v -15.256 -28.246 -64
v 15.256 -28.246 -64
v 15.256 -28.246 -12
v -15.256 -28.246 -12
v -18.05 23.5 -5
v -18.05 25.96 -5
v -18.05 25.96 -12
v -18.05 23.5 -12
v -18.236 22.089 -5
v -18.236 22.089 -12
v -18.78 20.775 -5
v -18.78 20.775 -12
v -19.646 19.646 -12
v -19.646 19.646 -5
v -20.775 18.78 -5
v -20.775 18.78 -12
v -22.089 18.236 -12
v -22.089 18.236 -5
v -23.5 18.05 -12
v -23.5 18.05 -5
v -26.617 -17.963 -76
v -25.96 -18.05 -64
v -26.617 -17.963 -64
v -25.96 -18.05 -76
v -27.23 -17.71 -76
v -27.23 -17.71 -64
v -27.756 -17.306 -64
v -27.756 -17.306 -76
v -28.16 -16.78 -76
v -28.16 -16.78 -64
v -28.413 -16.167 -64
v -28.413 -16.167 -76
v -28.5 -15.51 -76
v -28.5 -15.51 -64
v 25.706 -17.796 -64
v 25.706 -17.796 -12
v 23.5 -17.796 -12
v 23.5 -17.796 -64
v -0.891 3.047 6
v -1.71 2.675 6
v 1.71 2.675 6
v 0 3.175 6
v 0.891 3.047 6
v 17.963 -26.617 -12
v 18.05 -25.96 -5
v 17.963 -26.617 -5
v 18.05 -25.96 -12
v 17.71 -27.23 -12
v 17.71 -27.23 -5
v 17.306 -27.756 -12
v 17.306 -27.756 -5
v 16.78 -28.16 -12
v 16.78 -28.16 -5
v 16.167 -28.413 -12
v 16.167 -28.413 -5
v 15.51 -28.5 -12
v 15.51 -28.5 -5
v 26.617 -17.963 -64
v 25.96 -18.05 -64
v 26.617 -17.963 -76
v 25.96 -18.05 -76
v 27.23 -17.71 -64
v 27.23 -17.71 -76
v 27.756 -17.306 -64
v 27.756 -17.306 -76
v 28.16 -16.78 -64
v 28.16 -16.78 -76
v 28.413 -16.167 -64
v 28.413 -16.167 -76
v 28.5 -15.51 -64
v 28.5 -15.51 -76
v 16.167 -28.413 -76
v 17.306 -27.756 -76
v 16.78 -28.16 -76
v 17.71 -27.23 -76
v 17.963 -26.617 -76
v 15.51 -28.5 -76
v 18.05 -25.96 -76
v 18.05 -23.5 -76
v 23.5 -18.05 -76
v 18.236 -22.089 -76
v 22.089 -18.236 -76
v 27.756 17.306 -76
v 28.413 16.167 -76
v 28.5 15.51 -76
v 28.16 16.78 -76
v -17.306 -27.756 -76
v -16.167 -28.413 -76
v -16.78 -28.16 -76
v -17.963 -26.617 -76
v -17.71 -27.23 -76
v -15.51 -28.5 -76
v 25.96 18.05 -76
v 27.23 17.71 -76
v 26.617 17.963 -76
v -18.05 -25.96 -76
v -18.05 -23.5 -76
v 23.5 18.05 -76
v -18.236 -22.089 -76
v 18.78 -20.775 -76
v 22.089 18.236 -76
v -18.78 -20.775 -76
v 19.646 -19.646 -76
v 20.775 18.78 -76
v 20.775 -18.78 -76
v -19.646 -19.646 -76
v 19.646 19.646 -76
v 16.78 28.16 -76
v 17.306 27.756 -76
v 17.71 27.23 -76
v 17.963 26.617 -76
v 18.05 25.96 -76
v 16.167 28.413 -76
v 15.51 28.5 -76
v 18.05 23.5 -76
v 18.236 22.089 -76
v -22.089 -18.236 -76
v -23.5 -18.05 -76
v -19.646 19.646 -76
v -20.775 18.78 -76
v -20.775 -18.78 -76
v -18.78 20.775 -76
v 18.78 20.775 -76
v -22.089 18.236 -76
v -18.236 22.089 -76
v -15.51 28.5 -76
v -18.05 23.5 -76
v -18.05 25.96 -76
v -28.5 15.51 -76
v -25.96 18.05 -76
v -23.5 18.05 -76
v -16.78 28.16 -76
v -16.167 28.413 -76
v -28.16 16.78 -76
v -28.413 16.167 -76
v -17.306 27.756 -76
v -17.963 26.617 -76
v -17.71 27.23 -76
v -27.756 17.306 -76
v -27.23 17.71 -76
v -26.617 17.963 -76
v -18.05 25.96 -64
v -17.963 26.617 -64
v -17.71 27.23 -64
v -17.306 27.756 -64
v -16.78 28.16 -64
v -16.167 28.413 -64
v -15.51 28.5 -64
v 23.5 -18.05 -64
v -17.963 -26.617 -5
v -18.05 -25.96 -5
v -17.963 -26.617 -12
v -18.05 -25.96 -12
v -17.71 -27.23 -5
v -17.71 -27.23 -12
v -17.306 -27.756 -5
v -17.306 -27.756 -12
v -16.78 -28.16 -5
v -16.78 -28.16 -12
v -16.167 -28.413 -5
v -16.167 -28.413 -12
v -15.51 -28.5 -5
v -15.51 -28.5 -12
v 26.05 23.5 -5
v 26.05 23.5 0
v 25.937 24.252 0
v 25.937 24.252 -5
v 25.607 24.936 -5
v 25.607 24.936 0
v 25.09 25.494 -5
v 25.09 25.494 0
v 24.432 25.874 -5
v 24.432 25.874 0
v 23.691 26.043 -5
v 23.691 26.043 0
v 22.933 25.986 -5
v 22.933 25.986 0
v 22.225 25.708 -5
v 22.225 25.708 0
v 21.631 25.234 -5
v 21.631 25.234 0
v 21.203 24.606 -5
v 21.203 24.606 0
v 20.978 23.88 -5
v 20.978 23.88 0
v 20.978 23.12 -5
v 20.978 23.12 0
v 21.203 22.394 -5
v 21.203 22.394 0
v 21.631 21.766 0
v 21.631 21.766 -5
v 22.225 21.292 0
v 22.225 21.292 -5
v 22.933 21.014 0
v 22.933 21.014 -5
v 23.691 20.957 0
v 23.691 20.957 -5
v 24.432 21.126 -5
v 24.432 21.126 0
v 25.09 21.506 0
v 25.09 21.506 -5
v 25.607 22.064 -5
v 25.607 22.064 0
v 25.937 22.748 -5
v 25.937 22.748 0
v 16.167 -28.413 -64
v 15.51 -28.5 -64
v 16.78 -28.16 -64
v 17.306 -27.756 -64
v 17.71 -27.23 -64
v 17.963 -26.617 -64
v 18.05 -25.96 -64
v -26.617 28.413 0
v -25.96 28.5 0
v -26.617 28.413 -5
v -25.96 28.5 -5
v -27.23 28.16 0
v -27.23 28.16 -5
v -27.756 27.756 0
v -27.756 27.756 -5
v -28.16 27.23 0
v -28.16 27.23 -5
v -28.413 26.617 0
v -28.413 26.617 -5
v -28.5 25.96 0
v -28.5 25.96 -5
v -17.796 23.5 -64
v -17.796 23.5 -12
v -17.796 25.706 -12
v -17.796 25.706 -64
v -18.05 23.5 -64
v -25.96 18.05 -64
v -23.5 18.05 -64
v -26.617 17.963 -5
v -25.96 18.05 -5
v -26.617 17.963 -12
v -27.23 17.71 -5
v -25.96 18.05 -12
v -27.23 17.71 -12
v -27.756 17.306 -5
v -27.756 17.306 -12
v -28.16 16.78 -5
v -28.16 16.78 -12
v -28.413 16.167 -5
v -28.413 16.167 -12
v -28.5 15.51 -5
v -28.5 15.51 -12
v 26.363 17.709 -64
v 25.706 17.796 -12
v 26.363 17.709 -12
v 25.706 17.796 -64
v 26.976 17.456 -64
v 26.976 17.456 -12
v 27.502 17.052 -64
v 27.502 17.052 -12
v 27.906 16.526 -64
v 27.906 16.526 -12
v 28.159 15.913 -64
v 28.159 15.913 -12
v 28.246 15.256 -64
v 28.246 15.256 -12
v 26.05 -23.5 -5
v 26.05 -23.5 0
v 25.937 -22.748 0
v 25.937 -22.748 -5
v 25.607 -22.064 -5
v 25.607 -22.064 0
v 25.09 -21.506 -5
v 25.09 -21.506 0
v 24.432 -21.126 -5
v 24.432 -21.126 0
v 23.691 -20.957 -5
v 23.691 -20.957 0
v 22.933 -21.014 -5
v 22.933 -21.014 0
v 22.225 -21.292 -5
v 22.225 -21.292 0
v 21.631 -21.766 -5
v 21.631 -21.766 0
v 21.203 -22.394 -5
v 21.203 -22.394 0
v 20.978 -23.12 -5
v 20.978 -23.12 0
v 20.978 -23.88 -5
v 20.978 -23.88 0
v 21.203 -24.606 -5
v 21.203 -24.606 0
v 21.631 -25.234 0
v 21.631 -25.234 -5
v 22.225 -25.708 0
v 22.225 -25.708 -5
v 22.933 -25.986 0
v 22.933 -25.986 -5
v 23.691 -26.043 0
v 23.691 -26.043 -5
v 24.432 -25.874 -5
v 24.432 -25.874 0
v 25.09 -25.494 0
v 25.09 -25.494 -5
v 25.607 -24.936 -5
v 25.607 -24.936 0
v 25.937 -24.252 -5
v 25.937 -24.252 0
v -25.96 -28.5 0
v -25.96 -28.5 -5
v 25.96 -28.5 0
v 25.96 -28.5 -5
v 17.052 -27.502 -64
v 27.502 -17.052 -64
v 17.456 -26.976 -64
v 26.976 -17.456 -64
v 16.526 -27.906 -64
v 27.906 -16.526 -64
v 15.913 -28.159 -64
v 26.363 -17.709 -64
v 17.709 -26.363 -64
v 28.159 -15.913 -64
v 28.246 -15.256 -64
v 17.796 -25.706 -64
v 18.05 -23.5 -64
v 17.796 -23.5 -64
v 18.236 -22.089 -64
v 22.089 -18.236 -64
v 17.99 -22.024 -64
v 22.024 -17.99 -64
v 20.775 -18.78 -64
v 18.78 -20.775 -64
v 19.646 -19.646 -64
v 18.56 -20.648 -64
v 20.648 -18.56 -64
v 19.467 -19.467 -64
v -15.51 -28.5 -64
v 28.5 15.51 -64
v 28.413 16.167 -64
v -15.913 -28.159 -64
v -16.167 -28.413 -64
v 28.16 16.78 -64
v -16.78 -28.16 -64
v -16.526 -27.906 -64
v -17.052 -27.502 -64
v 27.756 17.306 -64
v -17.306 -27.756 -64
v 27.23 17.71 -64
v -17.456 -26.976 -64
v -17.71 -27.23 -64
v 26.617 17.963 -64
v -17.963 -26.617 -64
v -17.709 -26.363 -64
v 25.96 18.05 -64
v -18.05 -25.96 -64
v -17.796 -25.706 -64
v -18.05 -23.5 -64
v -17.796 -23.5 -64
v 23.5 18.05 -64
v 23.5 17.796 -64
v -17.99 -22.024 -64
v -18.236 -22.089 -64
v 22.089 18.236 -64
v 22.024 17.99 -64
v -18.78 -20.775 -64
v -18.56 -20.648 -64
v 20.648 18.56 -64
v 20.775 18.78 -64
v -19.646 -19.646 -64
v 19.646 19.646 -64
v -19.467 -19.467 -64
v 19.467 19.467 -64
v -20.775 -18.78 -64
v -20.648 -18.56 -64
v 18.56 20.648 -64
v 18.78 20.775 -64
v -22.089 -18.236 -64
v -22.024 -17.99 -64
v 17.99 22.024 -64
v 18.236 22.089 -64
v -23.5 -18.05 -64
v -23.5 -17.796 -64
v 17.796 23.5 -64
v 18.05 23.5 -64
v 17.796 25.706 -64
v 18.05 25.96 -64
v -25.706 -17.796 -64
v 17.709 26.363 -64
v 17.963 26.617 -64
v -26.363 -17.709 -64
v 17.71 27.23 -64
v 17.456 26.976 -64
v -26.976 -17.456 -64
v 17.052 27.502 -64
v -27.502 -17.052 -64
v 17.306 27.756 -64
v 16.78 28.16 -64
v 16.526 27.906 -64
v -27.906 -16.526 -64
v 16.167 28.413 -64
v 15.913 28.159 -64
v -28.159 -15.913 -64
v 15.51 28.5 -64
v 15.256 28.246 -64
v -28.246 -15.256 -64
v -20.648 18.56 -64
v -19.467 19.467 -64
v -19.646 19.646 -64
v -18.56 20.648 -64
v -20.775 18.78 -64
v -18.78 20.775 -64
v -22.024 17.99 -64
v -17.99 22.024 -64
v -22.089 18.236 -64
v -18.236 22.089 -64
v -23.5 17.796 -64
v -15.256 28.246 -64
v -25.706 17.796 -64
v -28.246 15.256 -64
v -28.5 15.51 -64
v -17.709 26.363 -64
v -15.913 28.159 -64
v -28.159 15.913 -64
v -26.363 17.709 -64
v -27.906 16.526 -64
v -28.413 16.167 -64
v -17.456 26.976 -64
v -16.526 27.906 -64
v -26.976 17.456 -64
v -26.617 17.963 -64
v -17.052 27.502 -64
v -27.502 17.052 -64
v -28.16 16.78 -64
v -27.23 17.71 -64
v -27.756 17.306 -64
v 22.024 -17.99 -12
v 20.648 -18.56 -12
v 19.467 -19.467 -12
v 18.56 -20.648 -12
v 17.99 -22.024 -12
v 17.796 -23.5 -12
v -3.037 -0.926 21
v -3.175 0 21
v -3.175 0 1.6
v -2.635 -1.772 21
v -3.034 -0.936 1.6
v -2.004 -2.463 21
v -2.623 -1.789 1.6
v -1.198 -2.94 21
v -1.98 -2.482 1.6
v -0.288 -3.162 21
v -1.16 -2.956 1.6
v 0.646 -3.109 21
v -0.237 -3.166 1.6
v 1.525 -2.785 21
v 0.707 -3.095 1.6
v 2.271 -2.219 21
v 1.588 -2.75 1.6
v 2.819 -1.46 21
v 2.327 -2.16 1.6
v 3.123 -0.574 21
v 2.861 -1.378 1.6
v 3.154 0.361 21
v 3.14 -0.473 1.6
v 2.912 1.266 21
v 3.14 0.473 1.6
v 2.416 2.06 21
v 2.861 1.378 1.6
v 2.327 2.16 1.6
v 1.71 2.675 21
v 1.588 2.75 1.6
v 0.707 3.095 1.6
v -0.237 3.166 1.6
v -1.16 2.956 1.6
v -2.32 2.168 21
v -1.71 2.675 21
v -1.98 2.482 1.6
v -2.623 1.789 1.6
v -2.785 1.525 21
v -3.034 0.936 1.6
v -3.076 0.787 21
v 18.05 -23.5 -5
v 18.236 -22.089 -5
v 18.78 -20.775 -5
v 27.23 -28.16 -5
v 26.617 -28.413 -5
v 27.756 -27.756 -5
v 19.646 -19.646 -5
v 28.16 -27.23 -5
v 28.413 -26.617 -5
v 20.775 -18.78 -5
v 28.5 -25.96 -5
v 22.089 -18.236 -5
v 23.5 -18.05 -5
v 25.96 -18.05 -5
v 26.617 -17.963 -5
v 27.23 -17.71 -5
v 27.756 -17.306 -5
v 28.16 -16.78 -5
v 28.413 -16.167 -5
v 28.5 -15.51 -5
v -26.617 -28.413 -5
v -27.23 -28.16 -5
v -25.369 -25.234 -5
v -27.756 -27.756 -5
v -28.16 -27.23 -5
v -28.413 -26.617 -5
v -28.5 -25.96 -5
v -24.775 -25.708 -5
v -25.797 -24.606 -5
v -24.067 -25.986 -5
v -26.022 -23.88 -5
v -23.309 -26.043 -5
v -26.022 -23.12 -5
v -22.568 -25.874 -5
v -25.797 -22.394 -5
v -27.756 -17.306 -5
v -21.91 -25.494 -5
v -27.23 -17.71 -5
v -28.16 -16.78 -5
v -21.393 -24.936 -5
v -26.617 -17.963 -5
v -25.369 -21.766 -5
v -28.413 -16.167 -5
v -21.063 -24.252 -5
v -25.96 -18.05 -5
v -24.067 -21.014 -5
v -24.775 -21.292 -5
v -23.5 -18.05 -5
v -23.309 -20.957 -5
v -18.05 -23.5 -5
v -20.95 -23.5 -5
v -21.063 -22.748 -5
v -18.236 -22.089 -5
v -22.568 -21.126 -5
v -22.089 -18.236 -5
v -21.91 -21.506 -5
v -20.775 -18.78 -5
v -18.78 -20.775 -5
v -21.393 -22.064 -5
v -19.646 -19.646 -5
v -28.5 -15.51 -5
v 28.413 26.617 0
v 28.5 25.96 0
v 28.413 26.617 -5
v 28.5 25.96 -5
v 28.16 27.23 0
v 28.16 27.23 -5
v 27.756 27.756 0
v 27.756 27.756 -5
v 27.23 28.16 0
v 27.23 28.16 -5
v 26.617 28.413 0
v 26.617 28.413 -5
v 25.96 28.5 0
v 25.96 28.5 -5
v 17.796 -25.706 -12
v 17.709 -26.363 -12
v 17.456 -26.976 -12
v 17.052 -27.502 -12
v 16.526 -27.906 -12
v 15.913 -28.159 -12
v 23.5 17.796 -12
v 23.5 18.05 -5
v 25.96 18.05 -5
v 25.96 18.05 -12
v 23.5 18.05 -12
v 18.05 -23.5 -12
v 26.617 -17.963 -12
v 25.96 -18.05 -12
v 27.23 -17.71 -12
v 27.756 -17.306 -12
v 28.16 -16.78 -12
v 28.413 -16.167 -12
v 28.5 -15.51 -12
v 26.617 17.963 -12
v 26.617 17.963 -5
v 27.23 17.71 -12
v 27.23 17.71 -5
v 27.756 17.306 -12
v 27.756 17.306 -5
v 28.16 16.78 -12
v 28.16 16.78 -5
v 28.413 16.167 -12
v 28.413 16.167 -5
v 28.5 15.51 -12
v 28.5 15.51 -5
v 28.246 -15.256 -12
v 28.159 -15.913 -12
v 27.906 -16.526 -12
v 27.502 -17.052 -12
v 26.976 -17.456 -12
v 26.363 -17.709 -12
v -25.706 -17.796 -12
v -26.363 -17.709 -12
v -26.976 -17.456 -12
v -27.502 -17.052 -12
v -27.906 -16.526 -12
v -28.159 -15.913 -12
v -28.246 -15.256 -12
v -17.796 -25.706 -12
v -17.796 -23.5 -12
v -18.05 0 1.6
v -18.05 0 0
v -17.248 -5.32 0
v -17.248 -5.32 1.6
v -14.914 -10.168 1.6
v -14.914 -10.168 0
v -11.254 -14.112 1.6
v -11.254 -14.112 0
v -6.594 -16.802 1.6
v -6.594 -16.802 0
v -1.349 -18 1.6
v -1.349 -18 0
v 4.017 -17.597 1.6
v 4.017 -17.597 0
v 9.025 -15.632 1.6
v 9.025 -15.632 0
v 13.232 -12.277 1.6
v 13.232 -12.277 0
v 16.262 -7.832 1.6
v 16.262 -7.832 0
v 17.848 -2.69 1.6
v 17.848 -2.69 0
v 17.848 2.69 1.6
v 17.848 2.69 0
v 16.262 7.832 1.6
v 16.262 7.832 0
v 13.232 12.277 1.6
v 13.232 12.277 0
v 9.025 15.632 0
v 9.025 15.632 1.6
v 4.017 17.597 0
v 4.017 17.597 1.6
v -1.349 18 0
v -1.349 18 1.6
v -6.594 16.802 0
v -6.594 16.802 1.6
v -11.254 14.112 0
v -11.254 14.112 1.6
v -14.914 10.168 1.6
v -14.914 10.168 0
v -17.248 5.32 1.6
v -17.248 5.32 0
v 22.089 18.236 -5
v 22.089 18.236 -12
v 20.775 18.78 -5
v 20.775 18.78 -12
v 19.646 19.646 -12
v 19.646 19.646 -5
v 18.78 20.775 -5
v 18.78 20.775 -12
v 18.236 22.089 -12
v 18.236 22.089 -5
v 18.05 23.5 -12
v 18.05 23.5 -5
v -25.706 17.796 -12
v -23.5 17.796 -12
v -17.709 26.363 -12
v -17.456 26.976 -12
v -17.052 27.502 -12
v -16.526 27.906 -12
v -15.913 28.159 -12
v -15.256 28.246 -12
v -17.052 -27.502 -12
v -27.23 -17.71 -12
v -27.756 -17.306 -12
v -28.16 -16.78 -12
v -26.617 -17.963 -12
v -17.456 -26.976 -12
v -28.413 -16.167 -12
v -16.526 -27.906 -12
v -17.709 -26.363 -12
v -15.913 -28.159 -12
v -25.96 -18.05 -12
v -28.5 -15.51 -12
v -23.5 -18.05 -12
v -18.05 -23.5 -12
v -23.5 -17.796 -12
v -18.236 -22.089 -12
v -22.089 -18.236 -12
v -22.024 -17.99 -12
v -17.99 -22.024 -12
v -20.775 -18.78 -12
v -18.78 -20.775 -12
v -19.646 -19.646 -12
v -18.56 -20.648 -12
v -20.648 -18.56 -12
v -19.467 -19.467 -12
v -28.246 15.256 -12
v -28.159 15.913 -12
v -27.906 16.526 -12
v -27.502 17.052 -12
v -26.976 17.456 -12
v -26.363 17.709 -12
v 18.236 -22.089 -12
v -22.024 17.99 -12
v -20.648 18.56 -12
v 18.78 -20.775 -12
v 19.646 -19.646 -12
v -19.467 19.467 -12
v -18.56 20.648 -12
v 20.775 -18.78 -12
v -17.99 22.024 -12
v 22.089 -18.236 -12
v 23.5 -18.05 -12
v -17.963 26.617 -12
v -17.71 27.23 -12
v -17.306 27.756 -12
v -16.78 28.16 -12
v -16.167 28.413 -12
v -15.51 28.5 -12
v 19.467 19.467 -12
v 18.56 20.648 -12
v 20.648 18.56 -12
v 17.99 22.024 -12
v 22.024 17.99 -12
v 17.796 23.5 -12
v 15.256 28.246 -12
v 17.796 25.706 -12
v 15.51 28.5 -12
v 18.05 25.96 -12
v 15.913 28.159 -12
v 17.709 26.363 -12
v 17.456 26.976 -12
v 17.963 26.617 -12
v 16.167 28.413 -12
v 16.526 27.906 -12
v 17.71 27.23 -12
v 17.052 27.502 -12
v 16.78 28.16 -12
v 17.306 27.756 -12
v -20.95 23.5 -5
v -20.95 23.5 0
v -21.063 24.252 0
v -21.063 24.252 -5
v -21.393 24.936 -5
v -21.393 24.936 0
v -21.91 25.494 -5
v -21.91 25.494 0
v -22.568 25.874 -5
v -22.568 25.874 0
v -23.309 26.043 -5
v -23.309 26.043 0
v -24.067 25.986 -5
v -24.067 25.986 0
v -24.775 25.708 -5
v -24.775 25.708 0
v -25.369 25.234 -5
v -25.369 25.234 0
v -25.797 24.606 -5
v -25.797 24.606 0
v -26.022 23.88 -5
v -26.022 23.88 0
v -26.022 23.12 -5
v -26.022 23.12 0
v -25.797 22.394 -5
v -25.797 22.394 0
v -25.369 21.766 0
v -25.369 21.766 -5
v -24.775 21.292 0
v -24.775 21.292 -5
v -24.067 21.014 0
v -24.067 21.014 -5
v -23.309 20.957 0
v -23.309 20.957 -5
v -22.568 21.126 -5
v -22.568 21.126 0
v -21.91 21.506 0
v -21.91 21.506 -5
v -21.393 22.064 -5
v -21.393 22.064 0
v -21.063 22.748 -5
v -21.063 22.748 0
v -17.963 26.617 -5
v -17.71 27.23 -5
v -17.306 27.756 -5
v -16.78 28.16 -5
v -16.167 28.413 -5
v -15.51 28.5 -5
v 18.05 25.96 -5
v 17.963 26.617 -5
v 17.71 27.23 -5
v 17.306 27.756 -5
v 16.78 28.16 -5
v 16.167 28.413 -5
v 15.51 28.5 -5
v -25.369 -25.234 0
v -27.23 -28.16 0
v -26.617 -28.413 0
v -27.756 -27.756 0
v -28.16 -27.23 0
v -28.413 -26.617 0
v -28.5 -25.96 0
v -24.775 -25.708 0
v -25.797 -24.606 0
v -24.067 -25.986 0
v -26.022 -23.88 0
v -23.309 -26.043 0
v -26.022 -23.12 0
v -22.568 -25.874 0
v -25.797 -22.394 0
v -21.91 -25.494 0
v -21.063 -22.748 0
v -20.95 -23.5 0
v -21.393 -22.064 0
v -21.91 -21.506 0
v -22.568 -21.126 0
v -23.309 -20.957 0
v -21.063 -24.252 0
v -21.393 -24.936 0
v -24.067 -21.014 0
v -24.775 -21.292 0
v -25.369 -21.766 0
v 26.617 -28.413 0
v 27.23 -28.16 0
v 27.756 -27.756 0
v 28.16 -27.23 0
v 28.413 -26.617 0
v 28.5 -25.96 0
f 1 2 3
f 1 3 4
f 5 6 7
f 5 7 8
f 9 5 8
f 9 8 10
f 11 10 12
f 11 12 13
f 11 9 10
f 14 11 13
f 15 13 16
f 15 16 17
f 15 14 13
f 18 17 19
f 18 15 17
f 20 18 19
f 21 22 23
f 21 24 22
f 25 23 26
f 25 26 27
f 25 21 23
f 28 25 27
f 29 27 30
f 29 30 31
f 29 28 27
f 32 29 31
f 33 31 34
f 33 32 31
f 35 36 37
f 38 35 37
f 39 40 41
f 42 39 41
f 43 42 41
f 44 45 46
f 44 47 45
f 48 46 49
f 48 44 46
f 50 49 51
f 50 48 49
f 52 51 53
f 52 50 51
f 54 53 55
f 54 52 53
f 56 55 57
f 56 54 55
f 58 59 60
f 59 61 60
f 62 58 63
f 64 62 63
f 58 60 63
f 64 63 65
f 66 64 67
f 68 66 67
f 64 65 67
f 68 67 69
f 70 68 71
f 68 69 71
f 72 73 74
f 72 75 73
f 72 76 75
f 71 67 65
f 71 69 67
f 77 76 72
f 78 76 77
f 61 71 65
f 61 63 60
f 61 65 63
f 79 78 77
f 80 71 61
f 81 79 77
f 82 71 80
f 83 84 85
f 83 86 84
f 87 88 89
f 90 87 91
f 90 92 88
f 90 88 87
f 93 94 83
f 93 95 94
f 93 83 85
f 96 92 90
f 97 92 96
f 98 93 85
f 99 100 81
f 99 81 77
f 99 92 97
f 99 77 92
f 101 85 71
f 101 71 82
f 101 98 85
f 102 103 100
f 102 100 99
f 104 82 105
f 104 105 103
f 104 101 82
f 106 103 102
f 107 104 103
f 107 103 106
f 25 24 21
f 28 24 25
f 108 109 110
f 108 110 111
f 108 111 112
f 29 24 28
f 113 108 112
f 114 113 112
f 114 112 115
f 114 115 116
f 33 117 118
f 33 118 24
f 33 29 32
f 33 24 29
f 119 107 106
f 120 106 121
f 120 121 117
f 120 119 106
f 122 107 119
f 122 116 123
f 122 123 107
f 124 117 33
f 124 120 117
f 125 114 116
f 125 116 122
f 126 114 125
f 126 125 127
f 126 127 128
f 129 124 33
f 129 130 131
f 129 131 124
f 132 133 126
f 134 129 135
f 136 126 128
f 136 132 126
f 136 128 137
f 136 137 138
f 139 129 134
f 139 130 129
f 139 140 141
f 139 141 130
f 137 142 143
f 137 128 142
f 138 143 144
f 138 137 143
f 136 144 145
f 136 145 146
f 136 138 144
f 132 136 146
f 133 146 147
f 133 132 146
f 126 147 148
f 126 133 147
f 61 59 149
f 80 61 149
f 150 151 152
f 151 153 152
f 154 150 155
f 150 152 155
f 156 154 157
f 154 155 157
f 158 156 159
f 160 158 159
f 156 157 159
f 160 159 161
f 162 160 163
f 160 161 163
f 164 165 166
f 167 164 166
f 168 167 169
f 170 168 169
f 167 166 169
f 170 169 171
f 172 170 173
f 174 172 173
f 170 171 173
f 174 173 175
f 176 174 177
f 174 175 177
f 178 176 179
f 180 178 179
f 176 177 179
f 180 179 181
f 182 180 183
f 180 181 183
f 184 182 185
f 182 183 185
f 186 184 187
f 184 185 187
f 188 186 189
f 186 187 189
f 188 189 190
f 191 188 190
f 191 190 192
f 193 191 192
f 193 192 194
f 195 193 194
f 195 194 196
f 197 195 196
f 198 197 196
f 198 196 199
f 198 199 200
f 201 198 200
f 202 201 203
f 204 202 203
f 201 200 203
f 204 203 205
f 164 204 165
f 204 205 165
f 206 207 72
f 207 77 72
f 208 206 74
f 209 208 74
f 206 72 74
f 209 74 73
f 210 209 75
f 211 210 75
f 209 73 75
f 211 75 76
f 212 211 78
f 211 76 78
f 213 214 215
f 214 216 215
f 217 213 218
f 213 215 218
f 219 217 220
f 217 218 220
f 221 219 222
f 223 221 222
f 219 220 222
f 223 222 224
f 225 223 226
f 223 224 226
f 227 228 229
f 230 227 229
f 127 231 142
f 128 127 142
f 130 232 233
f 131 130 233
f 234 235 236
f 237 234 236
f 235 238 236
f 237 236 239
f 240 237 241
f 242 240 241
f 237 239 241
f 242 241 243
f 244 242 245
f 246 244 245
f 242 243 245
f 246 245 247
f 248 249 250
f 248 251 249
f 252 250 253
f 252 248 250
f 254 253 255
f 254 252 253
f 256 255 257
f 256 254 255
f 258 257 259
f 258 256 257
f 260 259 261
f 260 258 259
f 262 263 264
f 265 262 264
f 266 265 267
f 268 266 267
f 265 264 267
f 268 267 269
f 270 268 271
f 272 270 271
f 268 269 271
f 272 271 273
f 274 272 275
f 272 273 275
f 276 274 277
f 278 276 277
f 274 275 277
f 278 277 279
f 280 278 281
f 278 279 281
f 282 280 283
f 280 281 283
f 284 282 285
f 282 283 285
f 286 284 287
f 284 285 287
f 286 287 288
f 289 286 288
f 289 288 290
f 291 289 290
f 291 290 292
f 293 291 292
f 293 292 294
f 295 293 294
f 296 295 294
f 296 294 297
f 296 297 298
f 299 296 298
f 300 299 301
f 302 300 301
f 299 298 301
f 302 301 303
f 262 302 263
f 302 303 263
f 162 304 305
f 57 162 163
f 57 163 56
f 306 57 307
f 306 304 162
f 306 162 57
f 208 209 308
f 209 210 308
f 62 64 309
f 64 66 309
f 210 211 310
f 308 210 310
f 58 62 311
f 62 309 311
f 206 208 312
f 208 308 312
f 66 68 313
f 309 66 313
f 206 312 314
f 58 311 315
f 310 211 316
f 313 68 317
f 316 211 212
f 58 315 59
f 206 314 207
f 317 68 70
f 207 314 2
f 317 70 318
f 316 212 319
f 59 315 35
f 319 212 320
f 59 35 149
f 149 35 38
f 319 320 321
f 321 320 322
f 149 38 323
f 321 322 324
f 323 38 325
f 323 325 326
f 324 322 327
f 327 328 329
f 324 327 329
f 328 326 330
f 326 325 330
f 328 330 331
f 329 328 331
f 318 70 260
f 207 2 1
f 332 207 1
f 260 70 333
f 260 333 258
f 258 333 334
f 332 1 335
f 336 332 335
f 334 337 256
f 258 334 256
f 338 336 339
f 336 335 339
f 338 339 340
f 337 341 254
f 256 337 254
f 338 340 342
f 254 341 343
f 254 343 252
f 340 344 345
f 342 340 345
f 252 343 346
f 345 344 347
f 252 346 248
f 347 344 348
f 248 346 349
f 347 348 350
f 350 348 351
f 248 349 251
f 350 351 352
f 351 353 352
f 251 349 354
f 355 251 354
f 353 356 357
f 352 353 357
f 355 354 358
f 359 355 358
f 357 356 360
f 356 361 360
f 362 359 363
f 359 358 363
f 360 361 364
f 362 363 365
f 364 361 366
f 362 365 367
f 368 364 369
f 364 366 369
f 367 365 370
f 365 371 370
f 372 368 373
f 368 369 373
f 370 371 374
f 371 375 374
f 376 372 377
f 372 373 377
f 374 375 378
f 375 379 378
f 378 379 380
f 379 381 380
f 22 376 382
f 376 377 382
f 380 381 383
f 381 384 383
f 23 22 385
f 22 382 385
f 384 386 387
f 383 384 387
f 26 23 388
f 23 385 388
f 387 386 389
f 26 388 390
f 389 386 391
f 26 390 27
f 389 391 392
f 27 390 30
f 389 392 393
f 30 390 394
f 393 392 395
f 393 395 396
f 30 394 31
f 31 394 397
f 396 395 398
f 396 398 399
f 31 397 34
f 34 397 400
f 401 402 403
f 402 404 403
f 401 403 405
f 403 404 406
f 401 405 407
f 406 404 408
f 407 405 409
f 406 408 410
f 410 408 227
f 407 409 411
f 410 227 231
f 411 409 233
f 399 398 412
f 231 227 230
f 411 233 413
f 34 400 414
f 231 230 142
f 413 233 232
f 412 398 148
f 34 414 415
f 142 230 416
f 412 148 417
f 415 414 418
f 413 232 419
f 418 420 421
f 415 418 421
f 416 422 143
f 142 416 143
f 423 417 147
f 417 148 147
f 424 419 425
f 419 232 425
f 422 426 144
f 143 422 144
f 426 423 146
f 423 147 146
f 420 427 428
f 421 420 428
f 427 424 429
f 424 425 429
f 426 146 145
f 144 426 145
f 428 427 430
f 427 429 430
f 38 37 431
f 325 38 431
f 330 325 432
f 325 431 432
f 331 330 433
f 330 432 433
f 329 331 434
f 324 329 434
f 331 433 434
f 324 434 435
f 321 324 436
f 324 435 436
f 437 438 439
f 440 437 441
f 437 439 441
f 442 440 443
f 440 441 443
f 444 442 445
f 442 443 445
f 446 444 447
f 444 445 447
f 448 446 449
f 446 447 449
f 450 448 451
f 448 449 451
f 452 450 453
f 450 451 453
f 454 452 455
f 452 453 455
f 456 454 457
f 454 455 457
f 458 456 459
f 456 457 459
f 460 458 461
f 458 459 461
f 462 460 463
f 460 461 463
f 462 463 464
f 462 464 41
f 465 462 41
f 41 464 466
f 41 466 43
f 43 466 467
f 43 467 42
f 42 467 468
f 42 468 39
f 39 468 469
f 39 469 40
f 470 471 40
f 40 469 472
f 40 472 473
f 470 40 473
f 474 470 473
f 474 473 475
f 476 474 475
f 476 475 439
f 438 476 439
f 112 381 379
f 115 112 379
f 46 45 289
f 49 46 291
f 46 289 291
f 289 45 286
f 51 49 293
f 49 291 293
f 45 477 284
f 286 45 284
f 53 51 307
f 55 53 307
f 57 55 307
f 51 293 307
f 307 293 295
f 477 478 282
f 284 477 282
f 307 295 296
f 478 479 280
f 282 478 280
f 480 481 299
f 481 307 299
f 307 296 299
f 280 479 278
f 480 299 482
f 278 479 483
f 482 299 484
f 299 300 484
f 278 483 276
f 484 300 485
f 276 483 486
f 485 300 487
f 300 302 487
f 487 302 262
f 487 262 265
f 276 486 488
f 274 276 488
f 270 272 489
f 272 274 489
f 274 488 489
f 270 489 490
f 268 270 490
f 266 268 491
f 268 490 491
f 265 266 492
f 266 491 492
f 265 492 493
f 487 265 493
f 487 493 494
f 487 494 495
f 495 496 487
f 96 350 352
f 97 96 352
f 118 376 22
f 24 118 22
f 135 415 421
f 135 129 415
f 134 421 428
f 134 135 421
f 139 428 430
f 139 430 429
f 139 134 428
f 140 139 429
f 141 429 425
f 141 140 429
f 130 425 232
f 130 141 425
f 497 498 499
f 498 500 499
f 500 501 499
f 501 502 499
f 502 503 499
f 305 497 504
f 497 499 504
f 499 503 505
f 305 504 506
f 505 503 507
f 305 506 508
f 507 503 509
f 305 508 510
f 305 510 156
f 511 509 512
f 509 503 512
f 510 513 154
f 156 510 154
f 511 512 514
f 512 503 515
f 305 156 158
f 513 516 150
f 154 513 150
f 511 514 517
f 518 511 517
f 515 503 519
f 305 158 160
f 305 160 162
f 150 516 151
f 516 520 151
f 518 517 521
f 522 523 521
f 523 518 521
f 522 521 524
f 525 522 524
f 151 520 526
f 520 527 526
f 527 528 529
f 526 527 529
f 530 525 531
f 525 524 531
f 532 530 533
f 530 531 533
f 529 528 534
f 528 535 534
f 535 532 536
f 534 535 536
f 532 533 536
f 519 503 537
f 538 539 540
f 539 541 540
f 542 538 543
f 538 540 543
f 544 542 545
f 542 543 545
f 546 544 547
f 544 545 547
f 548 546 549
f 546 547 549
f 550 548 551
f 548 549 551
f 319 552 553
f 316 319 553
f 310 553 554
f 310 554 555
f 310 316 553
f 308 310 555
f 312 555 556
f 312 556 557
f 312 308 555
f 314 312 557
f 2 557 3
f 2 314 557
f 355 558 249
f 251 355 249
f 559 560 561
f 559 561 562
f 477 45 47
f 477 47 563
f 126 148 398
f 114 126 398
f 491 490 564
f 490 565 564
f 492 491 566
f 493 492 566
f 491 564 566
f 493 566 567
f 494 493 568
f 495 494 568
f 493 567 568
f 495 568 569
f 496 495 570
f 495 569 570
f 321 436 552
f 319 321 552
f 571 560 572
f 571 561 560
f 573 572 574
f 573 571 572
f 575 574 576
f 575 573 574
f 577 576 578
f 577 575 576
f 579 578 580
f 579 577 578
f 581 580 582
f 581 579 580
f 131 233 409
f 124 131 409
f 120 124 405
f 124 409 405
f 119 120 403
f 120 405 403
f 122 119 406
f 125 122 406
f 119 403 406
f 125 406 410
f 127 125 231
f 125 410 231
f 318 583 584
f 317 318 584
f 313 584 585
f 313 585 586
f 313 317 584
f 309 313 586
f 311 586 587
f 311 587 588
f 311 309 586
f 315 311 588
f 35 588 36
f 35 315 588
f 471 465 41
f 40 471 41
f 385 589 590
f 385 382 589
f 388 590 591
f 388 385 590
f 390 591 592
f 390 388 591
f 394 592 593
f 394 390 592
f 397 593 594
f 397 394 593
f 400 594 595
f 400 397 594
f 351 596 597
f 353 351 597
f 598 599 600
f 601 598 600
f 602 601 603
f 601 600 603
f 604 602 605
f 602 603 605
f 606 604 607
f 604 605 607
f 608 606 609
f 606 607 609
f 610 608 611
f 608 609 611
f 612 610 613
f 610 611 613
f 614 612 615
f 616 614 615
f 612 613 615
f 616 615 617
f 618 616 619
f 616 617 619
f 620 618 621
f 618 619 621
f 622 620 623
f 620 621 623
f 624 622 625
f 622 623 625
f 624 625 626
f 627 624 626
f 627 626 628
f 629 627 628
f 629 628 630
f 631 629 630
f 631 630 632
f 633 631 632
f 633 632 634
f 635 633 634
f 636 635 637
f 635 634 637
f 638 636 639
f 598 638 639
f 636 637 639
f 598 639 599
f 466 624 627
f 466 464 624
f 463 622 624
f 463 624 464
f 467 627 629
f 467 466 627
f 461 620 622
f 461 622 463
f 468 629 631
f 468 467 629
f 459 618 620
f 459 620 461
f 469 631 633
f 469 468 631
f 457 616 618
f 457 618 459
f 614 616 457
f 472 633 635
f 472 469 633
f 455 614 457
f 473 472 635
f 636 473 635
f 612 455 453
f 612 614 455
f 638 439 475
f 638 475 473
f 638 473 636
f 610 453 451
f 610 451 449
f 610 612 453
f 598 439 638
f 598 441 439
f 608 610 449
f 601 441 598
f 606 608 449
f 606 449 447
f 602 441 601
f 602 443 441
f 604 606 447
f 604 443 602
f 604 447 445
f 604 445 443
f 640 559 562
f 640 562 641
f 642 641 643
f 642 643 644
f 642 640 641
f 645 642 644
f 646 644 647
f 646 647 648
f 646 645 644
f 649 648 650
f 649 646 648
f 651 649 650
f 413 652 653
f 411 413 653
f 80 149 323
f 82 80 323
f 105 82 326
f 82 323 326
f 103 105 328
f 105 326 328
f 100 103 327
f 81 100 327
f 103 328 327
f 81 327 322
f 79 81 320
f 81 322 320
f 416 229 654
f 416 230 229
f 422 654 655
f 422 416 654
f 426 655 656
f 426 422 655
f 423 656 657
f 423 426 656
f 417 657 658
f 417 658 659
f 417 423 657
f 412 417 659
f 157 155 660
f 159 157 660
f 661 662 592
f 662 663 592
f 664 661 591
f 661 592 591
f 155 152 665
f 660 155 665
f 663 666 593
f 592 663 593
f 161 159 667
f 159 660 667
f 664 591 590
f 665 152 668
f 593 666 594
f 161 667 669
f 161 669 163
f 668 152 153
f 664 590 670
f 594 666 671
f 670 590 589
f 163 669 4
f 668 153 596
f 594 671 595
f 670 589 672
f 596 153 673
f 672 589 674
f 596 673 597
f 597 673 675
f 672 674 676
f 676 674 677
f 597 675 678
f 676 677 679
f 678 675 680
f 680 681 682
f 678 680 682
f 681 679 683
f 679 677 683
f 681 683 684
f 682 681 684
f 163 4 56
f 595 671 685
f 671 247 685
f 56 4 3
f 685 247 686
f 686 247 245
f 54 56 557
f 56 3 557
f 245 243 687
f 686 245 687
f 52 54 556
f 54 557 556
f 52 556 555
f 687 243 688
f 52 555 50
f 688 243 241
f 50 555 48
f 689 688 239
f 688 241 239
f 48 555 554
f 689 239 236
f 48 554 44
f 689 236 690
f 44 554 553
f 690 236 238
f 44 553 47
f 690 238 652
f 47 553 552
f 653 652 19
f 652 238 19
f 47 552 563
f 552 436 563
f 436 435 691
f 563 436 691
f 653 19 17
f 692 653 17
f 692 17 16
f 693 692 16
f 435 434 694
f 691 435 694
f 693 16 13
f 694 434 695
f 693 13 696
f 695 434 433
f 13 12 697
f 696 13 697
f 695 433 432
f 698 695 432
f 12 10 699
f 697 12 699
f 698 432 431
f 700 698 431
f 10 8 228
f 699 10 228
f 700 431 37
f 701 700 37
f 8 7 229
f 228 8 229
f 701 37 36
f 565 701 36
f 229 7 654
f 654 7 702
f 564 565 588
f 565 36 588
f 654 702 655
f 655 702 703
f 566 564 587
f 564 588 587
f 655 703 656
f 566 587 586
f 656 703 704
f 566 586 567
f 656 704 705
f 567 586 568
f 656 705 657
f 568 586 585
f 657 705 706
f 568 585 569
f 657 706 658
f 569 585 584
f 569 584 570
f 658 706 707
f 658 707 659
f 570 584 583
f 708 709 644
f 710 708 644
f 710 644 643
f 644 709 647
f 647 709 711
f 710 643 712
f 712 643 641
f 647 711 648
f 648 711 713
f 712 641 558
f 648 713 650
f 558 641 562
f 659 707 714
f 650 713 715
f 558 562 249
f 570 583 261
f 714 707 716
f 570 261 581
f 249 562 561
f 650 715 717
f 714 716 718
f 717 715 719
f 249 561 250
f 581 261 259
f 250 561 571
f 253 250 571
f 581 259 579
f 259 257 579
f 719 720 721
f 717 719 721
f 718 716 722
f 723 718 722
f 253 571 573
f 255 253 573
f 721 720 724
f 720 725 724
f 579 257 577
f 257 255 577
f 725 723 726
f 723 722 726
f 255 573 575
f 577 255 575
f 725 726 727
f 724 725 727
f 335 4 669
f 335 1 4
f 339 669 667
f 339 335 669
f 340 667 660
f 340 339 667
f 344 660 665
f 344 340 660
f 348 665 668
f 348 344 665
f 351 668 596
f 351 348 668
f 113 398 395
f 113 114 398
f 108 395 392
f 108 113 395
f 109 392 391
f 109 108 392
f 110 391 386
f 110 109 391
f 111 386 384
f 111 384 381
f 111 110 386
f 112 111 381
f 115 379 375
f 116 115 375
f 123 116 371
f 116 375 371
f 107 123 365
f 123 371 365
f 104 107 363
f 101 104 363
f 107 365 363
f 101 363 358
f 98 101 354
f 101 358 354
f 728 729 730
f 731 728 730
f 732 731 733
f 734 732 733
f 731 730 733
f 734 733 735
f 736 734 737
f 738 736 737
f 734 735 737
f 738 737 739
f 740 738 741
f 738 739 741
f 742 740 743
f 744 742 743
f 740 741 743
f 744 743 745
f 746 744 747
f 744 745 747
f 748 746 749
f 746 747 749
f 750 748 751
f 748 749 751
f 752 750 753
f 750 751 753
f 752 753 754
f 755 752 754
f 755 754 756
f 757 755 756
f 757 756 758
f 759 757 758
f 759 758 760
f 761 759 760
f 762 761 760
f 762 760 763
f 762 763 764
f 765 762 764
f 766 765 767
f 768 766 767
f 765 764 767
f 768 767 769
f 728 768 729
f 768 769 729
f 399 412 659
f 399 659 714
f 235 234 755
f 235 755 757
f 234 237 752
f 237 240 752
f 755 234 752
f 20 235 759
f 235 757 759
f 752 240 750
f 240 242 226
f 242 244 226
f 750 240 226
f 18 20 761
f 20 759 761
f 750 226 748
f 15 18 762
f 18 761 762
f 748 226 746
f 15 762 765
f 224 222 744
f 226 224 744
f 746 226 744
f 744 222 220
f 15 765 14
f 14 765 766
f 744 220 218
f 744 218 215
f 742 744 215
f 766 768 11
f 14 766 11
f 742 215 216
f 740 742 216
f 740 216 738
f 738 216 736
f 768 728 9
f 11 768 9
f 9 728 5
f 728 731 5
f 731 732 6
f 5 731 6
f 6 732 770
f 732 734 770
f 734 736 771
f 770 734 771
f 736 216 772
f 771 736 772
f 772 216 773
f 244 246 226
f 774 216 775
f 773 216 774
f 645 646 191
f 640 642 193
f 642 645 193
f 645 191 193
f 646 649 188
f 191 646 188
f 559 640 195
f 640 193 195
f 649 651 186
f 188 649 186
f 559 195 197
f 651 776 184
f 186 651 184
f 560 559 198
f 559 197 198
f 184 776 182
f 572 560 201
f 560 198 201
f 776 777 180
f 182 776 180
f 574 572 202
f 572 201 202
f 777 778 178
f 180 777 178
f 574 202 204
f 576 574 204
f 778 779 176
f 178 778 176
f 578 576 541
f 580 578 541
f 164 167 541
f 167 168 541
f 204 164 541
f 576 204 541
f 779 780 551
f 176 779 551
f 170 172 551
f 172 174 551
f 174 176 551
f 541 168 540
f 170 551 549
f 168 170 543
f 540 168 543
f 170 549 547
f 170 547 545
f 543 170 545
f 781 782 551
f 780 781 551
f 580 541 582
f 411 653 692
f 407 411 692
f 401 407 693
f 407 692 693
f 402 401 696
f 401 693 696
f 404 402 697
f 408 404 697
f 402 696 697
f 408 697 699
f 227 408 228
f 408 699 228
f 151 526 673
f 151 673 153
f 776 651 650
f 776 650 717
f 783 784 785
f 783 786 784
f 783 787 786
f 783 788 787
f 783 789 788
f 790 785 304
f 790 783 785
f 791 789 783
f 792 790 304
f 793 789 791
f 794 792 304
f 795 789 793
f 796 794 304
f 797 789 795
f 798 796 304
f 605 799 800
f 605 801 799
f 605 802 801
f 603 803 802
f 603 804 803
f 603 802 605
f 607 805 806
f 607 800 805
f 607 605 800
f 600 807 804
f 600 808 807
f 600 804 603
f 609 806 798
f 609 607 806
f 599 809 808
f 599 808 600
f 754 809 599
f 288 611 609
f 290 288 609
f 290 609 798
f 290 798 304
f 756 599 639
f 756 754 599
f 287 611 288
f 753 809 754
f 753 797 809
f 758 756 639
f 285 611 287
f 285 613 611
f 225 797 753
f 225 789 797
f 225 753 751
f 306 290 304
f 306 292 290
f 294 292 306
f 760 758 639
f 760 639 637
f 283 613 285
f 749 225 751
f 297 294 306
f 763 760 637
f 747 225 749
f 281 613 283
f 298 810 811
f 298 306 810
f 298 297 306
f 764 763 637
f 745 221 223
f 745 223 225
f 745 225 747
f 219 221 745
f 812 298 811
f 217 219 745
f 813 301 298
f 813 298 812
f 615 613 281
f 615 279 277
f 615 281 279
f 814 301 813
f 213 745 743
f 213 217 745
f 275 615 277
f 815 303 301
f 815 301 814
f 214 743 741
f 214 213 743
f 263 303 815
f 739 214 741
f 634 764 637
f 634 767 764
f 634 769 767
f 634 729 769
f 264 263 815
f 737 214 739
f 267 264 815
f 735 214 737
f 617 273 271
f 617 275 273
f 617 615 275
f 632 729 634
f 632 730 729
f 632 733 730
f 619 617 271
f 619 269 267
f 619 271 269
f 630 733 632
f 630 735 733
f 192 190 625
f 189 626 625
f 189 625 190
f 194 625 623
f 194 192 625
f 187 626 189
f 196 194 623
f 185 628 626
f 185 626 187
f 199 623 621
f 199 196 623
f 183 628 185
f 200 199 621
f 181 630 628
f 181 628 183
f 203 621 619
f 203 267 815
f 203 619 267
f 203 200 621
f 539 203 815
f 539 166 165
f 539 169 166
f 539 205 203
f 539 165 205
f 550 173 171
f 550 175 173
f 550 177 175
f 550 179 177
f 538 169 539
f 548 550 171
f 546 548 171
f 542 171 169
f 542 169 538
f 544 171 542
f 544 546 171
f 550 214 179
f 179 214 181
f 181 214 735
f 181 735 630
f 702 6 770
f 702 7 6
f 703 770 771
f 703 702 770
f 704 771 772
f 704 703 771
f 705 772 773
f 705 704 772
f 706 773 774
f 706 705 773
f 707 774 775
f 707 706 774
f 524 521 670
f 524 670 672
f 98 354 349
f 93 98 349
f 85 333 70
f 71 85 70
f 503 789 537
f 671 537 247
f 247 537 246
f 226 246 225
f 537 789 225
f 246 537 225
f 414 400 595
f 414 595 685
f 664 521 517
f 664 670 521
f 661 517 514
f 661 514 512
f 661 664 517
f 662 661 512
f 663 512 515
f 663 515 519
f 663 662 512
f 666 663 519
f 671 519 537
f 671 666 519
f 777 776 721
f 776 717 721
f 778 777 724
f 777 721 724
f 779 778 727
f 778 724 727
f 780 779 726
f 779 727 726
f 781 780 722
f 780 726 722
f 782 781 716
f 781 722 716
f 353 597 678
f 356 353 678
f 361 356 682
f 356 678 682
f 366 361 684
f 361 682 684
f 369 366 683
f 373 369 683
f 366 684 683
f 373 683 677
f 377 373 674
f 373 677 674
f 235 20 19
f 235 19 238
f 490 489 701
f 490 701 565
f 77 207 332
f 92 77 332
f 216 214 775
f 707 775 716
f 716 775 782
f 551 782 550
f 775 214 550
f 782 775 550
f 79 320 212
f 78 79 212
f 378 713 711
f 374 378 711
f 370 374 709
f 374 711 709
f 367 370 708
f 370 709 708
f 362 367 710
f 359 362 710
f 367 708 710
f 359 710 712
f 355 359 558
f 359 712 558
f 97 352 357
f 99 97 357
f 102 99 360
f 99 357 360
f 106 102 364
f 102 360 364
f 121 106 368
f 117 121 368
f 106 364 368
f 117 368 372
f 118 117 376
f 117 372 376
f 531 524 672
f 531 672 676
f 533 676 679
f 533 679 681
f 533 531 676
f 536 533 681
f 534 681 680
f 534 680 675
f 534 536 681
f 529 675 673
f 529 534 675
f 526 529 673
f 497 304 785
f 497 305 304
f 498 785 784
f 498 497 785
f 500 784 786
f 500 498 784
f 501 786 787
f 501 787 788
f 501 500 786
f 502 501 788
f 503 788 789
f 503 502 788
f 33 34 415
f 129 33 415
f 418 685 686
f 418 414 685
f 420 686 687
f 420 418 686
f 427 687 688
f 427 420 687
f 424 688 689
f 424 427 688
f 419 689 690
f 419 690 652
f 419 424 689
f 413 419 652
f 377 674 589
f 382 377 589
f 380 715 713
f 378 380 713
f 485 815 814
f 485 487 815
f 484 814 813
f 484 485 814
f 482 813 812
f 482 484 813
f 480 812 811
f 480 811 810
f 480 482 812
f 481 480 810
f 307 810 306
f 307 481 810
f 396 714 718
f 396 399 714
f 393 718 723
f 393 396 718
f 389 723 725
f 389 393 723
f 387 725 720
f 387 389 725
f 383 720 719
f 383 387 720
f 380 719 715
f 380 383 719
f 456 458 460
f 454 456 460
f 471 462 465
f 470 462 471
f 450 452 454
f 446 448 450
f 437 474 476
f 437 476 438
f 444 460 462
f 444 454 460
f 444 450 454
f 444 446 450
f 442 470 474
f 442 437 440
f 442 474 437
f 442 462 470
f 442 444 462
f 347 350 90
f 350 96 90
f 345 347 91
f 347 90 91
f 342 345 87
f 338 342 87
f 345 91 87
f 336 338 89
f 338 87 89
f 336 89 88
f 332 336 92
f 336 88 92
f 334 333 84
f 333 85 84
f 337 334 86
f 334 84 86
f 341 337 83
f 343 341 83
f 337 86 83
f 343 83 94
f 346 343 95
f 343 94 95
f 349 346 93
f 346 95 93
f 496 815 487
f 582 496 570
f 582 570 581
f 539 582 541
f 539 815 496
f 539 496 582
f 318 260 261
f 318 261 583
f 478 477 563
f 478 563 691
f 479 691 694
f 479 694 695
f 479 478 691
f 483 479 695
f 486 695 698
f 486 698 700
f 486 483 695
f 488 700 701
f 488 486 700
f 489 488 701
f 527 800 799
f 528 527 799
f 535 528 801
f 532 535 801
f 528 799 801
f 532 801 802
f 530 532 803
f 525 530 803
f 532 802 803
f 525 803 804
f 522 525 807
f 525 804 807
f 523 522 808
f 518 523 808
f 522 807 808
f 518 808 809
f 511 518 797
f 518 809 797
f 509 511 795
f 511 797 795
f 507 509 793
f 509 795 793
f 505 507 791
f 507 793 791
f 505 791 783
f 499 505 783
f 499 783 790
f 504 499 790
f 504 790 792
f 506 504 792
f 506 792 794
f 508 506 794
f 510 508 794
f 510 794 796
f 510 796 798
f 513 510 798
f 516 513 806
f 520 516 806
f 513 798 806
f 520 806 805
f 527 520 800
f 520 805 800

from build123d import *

# Parameters (mm, degrees)
SKETCH1_W           = 57
SKETCH1_H           = 57
SKETCH1_R           = 2.55
BOSS_EXTRUDE1_DEPTH = 5
BOSS_EXTRUDE2_DEPTH = 7
BOSS_EXTRUDE5_DEPTH = 52
BOSS_EXTRUDE6_DEPTH = 12
SKETCH7_R           = 18.05
BOSS_EXTRUDE7_DEPTH = 1.6
SKETCH8_R           = 3.175
BOSS_EXTRUDE8_DEPTH = 21
SKETCH9_W           = 15
SKETCH9_H           = 0.5
CUT_EXTRUDE1_DEPTH  = 3.5
FILLET1_R           = 2.54


with BuildPart() as part:
    # Sketch1 → Boss-Extrude1 (new body)
    with BuildSketch(Plane.XY):
        Rectangle(SKETCH1_W, SKETCH1_H)
        with Locations((-23.5, 23.5)):
            Circle(SKETCH1_R, mode=Mode.SUBTRACT)
        with Locations((23.5, 23.5)):
            Circle(SKETCH1_R, mode=Mode.SUBTRACT)
        with Locations((23.5, -23.5)):
            Circle(SKETCH1_R, mode=Mode.SUBTRACT)
        with Locations((-23.5, -23.5)):
            Circle(SKETCH1_R, mode=Mode.SUBTRACT)
    extrude(amount=-BOSS_EXTRUDE1_DEPTH)

    # Sketch2 → Boss-Extrude2 (add)
    with BuildSketch(Plane(origin=(0, 0, -5), x_dir=(-1, 0, 0), z_dir=(0, 0, -1))):
        with BuildLine():
            Line((-18.05, 23.5), (-18.05, 28.5))
            Line((-18.05, 28.5), (18.05, 28.5))
            Line((18.05, 28.5), (18.05, 23.5))
            ThreePointArc((18.05, 23.5), (19.646268043, 19.646268043), (23.5, 18.05))
            Line((23.5, 18.05), (28.5, 18.05))
            Line((28.5, 18.05), (28.5, -18.05))
            Line((28.5, -18.05), (23.5, -18.05))
            ThreePointArc((23.5, -18.05), (19.646268043, -19.646268043), (18.05, -23.5))
            Line((18.05, -23.5), (18.05, -28.5))
            Line((18.05, -28.5), (-18.05, -28.5))
            Line((-18.05, -28.5), (-18.05, -23.5))
            ThreePointArc((-18.05, -23.5), (-19.646268043, -19.646268043), (-23.5, -18.05))
            Line((-23.5, -18.05), (-28.5, -18.05))
            Line((-28.5, -18.05), (-28.5, 18.05))
            Line((-28.5, 18.05), (-23.5, 18.05))
            ThreePointArc((-23.5, 18.05), (-19.646268043, 19.646268043), (-18.05, 23.5))
        make_face()
    extrude(amount=BOSS_EXTRUDE2_DEPTH)

    # Sketch5 → Boss-Extrude5 (add)
    with BuildSketch(Plane(origin=(0, 0, -12), x_dir=(-1, 0, 0), z_dir=(0, 0, -1))):
        with BuildLine():
            Line((-23.5, 17.796), (-28.246, 17.796))
            Line((-28.246, 17.796), (-28.246, -17.796))
            Line((-28.246, -17.796), (-23.5, -17.796))
            ThreePointArc((-23.5, -17.796), (-19.46666292, -19.46666292), (-17.796, -23.5))
            Line((-17.796, -23.5), (-17.796, -28.246))
            Line((-17.796, -28.246), (17.796, -28.246))
            Line((17.796, -28.246), (17.796, -23.5))
            ThreePointArc((17.796, -23.5), (19.46666292, -19.46666292), (23.5, -17.796))
            Line((23.5, -17.796), (28.246, -17.796))
            Line((28.246, -17.796), (28.246, 17.796))
            Line((28.246, 17.796), (23.5, 17.796))
            ThreePointArc((23.5, 17.796), (19.46666292, 19.46666292), (17.796, 23.5))
            Line((17.796, 23.5), (17.796, 28.246))
            Line((17.796, 28.246), (-17.796, 28.246))
            Line((-17.796, 28.246), (-17.796, 23.5))
            ThreePointArc((-17.796, 23.5), (-19.46666292, 19.46666292), (-23.5, 17.796))
        make_face()
    extrude(amount=BOSS_EXTRUDE5_DEPTH)

    # Sketch6 → Boss-Extrude6 (add)
    with BuildSketch(Plane(origin=(0, 0, -64), x_dir=(-1, 0, 0), z_dir=(0, 0, -1))):
        with BuildLine():
            Line((-23.5, 18.05), (-28.5, 18.05))
            Line((-28.5, 18.05), (-28.5, -18.05))
            Line((-28.5, -18.05), (-23.5, -18.05))
            ThreePointArc((-23.5, -18.05), (-19.646268043, -19.646268043), (-18.05, -23.5))
            Line((-18.05, -23.5), (-18.05, -28.5))
            Line((-18.05, -28.5), (18.05, -28.5))
            Line((18.05, -28.5), (18.05, -23.5))
            ThreePointArc((18.05, -23.5), (19.646268043, -19.646268043), (23.5, -18.05))
            Line((23.5, -18.05), (28.5, -18.05))
            Line((28.5, -18.05), (28.5, 18.05))
            Line((28.5, 18.05), (23.5, 18.05))
            ThreePointArc((23.5, 18.05), (19.646268043, 19.646268043), (18.05, 23.5))
            Line((18.05, 23.5), (18.05, 28.5))
            Line((18.05, 28.5), (-18.05, 28.5))
            Line((-18.05, 28.5), (-18.05, 23.5))
            ThreePointArc((-18.05, 23.5), (-19.646268043, 19.646268043), (-23.5, 18.05))
        make_face()
    extrude(amount=BOSS_EXTRUDE6_DEPTH)

    # Sketch7 → Boss-Extrude7 (add)
    with BuildSketch(Plane.XY):
        with Locations(Location((0, 0, 0), (0, 0, 180))):
            Circle(SKETCH7_R)
    extrude(amount=BOSS_EXTRUDE7_DEPTH)

    # Sketch8 → Boss-Extrude8 (add)
    with BuildSketch(Plane.XY):
        with Locations(Location((0, 0, 0), (0, 0, 180))):
            Circle(SKETCH8_R)
    extrude(amount=BOSS_EXTRUDE8_DEPTH)

    # Sketch9 → Cut-Extrude1 (cut, symmetric)
    with BuildSketch(Plane(origin=(0, 0, 0), x_dir=(0, 0, -1), z_dir=(1, 0, 0))):
        with Locations((-13.5, 2.925)):
            Rectangle(SKETCH9_W, SKETCH9_H)
    extrude(amount=CUT_EXTRUDE1_DEPTH, both=True, mode=Mode.SUBTRACT)

    # Fillet1
    fillet1_edges = [part.edges().sort_by_distance(p)[0] for p in [
        (28.5, 18.05, -70),
        (28.5, -18.05, -70),
        (18.05, -28.5, -70),
        (-18.05, -28.5, -70),
        (-28.5, -18.05, -70),
        (-28.5, 18.05, -70),
        (-18.05, 28.5, -70),
        (18.05, 28.5, -70),
        (28.5, 18.05, -8.5),
        (28.5, -18.05, -8.5),
        (18.05, -28.5, -8.5),
        (-18.05, -28.5, -8.5),
        (-28.5, -18.05, -8.5),
        (-28.5, 18.05, -8.5),
        (-18.05, 28.5, -8.5),
        (18.05, 28.5, -8.5),
        (28.5, -28.5, -2.5),
        (-28.5, -28.5, -2.5),
        (-28.5, 28.5, -2.5),
        (28.5, 28.5, -2.5),
        (28.246, 17.796, -38),
        (28.246, -17.796, -38),
        (17.796, -28.246, -38),
        (-17.796, -28.246, -38),
        (-28.246, -17.796, -38),
        (-28.246, 17.796, -38),
        (-17.796, 28.246, -38),
        (17.796, 28.246, -38),
    ]]
    fillet(fillet1_edges, radius=FILLET1_R)


solid = part.part
